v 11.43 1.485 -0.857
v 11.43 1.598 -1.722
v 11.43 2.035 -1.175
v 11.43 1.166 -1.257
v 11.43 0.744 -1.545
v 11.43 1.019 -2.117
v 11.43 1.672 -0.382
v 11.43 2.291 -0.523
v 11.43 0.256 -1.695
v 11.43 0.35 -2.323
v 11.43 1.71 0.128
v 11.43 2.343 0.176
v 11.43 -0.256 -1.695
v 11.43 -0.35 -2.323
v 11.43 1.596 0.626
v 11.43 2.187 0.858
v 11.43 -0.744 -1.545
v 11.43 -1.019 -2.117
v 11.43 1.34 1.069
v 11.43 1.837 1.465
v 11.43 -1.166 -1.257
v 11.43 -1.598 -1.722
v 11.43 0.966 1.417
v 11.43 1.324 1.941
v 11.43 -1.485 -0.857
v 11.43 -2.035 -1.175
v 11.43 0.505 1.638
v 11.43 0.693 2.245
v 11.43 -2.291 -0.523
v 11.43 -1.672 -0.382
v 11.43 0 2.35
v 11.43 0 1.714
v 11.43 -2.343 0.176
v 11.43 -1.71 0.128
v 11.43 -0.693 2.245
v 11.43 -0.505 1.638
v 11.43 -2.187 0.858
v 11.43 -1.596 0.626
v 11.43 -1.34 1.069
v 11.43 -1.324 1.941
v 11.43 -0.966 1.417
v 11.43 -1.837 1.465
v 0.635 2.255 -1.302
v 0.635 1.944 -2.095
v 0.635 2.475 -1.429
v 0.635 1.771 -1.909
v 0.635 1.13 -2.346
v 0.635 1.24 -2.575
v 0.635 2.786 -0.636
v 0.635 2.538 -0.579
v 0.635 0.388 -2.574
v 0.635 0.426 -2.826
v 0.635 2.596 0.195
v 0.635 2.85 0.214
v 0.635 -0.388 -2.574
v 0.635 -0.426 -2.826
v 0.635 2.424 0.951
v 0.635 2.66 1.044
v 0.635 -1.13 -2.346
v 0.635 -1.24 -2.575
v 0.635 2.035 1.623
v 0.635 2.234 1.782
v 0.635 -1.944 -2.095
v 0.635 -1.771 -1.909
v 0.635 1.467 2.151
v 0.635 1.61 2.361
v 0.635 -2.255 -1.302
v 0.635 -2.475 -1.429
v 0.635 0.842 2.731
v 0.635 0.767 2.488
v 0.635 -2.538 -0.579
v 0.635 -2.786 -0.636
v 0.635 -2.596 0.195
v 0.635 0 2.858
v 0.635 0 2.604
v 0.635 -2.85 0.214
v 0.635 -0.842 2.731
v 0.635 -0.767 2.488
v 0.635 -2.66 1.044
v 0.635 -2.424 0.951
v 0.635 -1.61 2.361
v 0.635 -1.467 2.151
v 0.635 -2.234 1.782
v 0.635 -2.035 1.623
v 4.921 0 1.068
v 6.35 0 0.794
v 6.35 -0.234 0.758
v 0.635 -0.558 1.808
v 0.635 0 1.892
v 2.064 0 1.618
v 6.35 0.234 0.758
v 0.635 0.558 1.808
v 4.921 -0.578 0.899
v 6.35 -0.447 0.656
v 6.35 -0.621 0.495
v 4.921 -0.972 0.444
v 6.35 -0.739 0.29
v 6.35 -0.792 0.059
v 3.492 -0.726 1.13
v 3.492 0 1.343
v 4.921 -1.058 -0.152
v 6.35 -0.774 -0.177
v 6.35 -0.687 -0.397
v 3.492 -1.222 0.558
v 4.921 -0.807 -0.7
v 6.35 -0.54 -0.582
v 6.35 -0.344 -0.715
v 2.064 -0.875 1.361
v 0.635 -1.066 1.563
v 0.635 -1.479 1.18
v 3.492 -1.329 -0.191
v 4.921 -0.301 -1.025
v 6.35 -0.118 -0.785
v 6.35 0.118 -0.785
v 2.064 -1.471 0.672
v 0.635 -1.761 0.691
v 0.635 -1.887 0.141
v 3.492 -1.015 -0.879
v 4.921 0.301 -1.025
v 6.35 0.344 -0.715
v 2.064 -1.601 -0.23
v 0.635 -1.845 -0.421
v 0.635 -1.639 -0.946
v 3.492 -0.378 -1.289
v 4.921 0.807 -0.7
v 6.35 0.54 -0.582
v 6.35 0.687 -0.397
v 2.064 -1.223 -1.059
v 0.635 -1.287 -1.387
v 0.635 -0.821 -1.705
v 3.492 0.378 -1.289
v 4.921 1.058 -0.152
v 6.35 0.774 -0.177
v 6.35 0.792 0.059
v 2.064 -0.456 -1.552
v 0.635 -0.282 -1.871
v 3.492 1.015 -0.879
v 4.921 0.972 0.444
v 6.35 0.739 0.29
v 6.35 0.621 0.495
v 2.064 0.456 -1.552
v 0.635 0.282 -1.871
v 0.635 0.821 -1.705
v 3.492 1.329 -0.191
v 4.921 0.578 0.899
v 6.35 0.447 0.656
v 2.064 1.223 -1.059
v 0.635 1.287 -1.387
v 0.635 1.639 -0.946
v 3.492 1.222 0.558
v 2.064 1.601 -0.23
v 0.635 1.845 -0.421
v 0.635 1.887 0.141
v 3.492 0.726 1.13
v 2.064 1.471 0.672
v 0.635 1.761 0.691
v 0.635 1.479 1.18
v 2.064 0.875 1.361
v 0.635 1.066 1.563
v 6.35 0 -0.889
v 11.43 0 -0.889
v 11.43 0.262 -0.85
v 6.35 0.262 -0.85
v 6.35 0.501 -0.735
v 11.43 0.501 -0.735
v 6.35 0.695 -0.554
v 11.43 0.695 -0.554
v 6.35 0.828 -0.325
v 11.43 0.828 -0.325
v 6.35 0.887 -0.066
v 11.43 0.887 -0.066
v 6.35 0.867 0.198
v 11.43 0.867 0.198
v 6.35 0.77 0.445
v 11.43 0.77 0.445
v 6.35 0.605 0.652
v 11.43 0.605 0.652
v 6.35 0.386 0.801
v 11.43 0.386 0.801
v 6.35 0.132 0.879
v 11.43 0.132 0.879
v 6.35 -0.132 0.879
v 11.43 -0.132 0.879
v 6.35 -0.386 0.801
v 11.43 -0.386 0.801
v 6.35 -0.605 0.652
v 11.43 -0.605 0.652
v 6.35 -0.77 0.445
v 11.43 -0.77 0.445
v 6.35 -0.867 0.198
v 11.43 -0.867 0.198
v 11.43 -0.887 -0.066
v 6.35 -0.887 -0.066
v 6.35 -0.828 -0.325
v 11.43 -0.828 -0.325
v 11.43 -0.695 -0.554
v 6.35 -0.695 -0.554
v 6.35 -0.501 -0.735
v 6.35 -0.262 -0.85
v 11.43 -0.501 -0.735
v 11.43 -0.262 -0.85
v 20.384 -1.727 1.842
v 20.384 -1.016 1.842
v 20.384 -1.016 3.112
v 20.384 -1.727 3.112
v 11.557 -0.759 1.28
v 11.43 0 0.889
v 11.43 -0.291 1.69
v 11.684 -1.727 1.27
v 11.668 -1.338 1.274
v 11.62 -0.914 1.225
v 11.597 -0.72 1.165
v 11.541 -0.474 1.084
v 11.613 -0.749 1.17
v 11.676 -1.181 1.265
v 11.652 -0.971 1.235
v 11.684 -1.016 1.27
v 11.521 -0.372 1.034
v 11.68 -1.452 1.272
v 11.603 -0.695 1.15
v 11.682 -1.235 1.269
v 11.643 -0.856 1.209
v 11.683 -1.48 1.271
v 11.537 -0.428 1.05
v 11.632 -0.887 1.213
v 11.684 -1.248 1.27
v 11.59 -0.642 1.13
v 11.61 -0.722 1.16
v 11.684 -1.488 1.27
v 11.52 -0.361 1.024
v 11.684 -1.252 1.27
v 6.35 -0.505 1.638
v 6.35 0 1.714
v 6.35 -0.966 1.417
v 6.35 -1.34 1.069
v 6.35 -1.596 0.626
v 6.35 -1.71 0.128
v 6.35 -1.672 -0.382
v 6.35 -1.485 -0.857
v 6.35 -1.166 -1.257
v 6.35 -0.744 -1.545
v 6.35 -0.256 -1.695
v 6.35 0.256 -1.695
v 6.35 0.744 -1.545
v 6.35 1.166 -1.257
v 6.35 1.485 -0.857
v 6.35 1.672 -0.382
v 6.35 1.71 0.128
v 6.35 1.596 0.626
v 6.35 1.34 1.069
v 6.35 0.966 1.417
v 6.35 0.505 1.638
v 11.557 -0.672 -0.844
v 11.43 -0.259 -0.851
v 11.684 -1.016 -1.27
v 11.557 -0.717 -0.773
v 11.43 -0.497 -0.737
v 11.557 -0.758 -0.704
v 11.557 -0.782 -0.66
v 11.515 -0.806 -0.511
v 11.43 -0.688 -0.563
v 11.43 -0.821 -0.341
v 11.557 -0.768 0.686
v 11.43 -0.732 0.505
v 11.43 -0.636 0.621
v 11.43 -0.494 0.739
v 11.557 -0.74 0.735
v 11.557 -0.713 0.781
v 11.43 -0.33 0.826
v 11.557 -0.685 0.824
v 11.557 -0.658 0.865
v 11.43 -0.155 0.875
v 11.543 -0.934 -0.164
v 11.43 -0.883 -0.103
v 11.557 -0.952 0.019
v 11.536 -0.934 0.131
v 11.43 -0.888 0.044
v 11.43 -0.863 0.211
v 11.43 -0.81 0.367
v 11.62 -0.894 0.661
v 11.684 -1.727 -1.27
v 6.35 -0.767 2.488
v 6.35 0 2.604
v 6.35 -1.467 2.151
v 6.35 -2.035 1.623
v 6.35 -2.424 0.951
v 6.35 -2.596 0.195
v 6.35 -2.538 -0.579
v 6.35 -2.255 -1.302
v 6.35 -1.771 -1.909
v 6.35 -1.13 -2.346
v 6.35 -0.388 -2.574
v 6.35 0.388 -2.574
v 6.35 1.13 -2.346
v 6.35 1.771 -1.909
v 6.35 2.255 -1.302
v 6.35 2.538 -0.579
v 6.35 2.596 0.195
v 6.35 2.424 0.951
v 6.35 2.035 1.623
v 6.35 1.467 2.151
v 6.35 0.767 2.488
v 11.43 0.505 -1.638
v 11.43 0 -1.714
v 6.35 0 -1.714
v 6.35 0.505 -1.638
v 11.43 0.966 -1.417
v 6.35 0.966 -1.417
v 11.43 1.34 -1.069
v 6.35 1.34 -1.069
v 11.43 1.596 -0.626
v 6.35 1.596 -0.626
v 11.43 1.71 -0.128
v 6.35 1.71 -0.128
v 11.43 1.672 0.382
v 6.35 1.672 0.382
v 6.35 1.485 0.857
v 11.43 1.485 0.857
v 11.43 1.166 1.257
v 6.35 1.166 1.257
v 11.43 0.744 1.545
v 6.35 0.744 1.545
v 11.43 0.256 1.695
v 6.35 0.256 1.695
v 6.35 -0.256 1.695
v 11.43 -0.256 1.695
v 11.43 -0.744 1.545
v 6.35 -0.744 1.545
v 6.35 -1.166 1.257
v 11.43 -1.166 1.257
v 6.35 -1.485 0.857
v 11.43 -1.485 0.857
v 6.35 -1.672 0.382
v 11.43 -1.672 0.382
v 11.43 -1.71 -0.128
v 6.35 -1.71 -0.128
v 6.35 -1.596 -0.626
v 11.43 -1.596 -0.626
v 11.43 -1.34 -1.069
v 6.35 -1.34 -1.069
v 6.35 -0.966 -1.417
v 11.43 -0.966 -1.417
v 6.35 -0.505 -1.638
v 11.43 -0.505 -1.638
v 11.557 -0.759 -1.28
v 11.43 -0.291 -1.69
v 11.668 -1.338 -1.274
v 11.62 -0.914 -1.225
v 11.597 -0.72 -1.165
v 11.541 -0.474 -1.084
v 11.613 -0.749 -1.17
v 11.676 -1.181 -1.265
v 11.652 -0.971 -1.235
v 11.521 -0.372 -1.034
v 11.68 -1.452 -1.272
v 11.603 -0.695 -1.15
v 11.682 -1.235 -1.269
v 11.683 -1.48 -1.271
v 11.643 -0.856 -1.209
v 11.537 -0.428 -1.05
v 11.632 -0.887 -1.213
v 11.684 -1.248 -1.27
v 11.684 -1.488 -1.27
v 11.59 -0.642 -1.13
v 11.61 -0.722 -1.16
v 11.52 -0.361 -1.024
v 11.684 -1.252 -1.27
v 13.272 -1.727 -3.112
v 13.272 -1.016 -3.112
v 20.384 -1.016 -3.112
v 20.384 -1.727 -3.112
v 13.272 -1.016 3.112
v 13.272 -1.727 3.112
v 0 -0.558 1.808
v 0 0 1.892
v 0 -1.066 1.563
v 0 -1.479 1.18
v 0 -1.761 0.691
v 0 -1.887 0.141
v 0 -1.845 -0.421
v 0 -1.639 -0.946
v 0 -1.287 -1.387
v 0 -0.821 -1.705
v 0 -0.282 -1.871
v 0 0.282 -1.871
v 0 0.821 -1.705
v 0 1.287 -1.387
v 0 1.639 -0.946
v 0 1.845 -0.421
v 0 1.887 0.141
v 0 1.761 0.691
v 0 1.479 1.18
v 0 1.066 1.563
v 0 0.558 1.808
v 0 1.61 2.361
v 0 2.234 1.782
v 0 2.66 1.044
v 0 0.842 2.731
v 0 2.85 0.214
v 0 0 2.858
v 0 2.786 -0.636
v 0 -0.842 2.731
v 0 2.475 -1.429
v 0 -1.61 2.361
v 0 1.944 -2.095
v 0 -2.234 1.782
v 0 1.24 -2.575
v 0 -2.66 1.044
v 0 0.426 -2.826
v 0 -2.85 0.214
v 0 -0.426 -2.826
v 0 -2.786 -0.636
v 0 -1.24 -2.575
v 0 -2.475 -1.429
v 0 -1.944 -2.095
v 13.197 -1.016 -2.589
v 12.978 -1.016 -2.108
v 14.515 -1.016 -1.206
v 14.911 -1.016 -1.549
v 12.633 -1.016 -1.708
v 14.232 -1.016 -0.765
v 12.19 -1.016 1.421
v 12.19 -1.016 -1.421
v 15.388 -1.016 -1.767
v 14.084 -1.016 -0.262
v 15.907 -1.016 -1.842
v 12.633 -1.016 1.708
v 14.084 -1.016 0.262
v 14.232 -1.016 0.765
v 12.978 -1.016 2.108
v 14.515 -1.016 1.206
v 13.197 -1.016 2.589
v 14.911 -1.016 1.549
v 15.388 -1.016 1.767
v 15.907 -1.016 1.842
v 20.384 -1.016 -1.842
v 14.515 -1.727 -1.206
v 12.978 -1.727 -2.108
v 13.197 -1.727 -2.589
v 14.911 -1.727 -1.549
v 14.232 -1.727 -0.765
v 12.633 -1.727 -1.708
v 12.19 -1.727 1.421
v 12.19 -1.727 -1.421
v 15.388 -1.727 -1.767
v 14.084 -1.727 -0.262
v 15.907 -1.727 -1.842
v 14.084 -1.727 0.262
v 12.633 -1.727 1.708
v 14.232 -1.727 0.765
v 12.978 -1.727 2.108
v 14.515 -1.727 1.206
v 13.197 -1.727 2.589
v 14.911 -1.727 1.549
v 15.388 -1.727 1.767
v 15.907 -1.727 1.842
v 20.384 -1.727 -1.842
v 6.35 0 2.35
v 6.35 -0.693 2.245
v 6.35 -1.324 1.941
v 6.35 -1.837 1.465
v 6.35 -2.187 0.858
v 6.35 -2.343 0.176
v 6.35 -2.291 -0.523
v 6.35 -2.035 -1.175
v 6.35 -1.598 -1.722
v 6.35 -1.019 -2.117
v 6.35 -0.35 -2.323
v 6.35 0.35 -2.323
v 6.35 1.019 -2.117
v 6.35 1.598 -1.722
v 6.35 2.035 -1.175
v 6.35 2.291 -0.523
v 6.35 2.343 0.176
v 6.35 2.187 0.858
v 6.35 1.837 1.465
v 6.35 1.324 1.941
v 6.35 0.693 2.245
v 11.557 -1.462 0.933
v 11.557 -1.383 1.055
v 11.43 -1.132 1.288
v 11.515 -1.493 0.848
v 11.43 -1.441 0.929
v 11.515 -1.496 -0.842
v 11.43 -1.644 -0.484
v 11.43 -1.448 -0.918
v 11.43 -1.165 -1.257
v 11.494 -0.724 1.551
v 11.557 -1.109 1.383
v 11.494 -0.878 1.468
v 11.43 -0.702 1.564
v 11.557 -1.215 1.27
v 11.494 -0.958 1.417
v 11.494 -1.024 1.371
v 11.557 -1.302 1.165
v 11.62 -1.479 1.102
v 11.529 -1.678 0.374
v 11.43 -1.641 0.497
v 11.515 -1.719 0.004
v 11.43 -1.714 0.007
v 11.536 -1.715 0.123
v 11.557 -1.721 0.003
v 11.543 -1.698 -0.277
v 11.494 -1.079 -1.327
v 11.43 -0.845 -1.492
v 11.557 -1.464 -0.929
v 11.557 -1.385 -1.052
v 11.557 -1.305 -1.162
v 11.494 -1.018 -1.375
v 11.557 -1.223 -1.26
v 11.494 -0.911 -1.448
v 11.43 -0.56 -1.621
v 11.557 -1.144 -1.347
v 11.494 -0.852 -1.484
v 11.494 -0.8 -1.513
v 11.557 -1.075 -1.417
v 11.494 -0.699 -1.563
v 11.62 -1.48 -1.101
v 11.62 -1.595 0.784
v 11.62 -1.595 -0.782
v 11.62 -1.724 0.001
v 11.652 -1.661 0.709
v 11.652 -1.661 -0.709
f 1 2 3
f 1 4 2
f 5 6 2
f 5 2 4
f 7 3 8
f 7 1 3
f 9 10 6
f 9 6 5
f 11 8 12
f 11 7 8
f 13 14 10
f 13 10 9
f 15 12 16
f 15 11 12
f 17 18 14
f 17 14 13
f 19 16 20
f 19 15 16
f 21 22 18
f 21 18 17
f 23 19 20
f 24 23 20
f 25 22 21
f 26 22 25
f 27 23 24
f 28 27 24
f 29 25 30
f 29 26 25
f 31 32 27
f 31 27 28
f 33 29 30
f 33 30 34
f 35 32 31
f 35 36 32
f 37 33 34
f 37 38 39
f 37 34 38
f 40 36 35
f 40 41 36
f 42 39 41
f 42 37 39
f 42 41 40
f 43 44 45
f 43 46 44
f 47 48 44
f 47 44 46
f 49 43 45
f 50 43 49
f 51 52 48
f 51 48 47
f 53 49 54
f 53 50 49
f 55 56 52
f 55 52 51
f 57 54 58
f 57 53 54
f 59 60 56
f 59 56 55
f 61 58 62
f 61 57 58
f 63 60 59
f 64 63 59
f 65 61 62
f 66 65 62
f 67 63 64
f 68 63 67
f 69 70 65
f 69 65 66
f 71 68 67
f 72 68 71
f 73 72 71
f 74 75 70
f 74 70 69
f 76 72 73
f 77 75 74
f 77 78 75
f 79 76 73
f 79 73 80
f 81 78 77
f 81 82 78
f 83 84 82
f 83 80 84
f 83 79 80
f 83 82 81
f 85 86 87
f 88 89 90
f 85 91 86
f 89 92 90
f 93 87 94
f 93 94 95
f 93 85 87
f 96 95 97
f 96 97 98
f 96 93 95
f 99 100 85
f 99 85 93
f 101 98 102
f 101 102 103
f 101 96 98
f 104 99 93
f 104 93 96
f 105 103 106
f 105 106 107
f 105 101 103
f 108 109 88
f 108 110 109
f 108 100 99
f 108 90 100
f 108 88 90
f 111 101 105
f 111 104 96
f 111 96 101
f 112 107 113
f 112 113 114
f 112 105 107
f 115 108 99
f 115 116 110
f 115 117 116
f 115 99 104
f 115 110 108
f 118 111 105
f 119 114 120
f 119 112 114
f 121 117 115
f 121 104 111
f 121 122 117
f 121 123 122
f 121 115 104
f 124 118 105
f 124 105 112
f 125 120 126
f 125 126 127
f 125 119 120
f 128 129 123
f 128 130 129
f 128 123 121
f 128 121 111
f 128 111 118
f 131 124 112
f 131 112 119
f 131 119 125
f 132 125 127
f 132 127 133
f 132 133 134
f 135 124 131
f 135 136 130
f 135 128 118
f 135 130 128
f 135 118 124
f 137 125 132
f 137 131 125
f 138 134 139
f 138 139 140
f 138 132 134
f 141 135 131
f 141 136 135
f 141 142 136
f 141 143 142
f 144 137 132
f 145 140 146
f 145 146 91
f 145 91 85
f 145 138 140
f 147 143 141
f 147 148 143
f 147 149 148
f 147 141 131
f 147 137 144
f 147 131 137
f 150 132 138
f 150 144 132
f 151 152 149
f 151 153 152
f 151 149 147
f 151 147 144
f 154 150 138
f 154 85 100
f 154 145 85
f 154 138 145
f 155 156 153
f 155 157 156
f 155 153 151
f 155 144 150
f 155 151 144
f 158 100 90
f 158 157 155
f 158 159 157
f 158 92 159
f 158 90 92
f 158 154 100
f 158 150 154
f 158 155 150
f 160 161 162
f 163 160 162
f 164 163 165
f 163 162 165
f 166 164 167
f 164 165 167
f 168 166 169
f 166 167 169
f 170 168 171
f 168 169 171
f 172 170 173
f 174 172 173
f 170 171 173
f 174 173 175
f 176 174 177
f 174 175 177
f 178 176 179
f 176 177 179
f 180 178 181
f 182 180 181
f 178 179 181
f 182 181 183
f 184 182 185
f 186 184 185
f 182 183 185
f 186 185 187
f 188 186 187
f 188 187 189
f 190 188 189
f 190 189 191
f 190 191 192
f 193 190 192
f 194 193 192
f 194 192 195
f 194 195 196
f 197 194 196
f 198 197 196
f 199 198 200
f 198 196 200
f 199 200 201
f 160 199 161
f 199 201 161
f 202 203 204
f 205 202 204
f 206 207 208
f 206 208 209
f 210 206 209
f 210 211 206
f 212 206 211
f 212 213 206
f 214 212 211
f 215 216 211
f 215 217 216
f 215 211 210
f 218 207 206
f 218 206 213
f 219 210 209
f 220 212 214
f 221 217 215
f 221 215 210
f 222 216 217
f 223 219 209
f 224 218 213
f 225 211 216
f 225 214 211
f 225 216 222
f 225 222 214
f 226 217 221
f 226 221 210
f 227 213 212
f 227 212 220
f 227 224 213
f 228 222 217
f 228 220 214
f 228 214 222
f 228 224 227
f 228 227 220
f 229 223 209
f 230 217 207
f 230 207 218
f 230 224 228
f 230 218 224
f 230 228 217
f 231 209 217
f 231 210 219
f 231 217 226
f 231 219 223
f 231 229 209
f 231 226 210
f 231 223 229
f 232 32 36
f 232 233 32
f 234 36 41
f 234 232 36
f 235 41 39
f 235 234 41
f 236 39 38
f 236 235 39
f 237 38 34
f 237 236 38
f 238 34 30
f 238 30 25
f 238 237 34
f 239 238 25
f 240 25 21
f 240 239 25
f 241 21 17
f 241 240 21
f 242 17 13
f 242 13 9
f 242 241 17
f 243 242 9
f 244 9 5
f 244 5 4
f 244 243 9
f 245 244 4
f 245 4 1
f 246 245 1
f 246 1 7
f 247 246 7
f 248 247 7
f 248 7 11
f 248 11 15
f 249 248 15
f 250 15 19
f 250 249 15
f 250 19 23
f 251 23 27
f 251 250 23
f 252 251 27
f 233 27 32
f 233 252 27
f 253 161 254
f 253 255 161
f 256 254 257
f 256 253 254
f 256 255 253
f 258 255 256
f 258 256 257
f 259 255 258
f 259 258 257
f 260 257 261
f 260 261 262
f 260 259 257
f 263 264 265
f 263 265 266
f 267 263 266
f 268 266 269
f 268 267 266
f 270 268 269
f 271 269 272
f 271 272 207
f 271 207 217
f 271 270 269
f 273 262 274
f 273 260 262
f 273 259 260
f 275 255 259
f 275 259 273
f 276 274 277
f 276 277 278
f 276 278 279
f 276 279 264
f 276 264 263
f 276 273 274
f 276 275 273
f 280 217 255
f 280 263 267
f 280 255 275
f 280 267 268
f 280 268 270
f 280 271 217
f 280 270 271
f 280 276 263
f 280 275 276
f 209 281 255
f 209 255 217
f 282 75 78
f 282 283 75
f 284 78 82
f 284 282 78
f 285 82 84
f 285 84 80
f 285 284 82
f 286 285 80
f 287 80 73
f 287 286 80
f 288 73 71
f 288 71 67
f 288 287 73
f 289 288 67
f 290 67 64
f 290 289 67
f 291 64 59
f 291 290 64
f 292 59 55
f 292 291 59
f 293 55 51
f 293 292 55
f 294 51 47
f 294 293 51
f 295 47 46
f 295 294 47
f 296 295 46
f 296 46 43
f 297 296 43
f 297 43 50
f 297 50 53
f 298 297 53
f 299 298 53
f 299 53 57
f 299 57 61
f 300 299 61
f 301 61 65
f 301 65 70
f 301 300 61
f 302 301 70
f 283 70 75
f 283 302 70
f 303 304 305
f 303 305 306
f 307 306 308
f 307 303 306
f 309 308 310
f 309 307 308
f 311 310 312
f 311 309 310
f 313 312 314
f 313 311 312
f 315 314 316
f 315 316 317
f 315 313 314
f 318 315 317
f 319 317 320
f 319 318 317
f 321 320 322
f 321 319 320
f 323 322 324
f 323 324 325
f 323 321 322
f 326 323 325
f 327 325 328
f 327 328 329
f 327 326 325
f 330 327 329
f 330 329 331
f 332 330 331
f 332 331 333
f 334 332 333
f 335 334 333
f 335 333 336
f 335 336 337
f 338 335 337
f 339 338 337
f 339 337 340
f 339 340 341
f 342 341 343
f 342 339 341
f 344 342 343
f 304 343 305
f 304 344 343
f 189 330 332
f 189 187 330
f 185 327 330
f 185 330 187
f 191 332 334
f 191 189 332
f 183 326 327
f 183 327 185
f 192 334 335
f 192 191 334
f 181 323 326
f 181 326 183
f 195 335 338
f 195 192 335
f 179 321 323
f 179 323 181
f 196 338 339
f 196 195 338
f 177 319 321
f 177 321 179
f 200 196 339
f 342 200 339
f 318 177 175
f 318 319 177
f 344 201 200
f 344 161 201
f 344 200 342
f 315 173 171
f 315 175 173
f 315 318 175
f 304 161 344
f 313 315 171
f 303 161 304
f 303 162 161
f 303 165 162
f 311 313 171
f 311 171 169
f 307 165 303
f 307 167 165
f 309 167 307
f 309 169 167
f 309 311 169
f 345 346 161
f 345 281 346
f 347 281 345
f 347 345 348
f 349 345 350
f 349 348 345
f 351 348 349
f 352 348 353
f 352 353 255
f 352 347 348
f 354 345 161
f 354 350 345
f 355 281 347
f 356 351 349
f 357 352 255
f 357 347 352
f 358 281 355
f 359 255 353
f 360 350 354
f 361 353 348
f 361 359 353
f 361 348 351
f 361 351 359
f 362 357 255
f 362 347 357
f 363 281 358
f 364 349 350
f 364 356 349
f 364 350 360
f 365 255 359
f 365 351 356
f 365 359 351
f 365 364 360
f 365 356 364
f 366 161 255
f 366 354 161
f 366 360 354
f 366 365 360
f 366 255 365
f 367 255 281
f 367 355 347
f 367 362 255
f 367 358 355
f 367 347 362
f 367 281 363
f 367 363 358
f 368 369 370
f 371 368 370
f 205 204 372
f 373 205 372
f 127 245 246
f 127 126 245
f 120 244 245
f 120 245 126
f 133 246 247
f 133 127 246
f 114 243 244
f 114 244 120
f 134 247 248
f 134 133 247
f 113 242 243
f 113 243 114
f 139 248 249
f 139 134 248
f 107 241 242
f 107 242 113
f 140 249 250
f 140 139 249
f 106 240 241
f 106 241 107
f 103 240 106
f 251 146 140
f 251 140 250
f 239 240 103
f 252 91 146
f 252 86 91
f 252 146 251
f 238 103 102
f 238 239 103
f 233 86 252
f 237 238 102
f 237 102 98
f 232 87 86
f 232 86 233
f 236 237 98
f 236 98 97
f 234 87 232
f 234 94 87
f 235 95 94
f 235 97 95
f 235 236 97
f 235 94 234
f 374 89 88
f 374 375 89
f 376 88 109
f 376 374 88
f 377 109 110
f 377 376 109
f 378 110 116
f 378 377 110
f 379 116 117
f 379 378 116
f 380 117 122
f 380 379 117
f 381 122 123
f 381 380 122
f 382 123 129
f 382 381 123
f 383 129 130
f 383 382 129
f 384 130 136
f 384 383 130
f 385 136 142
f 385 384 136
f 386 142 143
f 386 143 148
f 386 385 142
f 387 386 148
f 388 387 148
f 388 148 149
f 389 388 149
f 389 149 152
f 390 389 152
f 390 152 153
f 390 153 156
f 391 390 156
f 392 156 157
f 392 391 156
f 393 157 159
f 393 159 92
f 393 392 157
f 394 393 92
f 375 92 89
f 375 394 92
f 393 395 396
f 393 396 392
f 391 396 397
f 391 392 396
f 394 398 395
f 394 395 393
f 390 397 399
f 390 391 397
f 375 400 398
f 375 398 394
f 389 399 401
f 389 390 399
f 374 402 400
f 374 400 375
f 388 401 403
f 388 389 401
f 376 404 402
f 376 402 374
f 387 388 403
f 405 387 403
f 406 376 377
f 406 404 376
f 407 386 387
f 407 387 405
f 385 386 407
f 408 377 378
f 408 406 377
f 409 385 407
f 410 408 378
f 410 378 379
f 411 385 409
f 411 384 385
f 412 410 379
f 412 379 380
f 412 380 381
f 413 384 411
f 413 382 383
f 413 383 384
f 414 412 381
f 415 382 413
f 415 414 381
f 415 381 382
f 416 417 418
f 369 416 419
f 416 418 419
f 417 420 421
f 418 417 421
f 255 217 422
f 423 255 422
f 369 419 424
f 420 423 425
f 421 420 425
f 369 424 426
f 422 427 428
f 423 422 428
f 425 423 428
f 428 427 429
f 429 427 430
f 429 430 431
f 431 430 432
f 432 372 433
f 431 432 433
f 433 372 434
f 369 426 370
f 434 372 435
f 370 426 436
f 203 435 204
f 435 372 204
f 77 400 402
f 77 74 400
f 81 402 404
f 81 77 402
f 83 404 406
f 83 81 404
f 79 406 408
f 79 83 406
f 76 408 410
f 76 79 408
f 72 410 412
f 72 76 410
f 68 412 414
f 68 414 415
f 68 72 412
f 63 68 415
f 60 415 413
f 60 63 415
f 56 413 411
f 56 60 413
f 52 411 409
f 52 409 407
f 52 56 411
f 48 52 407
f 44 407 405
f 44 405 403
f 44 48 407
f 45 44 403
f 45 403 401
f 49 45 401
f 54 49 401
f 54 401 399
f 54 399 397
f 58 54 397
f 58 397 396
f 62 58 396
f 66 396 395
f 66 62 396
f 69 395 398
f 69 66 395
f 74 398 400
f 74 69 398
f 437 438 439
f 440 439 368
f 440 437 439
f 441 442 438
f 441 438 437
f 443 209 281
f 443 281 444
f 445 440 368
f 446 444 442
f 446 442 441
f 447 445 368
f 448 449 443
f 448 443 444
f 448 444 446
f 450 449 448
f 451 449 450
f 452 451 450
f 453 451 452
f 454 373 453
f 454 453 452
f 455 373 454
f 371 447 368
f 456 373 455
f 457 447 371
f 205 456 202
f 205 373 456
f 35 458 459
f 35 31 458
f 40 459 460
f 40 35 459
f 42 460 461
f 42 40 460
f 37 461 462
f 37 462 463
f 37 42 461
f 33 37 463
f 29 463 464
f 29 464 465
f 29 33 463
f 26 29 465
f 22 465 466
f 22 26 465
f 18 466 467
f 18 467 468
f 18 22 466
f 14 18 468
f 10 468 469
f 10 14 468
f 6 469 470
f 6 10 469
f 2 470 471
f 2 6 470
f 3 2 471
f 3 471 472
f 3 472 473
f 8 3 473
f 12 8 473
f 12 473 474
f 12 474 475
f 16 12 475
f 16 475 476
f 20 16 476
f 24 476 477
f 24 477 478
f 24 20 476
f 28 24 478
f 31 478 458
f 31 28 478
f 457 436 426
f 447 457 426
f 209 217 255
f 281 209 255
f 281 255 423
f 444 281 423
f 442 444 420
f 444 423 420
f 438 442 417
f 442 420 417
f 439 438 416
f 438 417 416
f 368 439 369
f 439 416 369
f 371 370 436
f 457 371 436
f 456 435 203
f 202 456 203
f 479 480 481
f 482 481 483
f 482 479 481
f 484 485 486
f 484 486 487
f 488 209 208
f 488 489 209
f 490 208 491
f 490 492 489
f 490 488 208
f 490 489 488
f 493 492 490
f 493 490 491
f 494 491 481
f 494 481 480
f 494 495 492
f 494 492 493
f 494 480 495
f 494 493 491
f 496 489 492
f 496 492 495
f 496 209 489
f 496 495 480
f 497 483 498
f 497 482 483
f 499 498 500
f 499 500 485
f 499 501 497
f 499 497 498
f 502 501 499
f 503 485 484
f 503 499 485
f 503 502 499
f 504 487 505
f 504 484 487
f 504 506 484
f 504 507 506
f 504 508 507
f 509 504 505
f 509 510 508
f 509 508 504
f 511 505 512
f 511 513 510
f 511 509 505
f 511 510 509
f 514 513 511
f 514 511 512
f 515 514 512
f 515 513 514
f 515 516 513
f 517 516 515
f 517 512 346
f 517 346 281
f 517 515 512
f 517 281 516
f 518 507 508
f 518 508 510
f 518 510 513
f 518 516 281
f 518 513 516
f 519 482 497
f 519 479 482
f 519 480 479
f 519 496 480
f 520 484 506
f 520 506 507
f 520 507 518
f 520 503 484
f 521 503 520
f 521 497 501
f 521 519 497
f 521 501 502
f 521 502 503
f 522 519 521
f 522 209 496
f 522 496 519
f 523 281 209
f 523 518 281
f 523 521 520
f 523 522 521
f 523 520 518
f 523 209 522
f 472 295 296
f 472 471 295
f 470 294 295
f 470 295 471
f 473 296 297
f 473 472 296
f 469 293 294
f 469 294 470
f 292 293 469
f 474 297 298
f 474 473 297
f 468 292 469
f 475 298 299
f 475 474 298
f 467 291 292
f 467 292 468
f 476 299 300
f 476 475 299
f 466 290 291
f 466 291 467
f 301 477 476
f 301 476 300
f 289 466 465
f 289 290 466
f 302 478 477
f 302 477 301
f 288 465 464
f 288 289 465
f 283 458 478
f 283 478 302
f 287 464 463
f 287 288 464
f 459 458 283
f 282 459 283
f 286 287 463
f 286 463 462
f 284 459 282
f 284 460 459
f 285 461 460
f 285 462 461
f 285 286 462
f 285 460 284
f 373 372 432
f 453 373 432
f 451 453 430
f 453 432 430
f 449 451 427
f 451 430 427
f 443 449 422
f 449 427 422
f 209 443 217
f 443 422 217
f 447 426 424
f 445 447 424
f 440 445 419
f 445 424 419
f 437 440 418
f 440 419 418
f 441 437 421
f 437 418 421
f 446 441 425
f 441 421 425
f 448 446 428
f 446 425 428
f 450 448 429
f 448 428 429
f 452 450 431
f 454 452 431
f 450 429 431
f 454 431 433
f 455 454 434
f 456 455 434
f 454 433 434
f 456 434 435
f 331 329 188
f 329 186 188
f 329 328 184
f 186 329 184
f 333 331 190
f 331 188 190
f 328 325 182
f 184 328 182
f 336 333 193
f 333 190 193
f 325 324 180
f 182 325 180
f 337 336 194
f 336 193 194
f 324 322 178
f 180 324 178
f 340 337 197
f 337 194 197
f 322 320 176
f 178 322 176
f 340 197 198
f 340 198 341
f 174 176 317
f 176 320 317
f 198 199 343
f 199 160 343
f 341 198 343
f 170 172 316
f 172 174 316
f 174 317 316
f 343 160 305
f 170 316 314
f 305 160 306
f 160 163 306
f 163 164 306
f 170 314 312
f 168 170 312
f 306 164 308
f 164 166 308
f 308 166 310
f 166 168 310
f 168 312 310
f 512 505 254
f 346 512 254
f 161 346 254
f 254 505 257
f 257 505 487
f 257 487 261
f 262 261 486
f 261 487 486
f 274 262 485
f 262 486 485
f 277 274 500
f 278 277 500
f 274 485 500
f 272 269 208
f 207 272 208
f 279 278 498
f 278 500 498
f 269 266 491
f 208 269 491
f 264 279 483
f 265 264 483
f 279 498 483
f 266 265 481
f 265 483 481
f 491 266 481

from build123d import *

# Parameters (mm, degrees)
EXTRUDE6_DEPTH = 0.7112
SKETCH11_R     = 1.7145
SKETCH11_R_2   = 0.889
EXTRUDE7_DEPTH = 5.08


with BuildPart() as part:
    # Sketch5 → Revolve1 (revolve)
    with BuildSketch(Plane.XY, mode=Mode.PRIVATE) as revolve1_sk:
        Polygon((0, 2.8575), (0.635, 2.8575), (0.635, 2.6035), (6.35, 2.6035), (6.35, 2.3495), (11.43, 2.3495), (11.43, 1.7145), (6.35, 1.7145), (6.35, 0.79375), (0.635, 1.8923), (0, 1.8923), align=None)
    revolve(revolve1_sk.sketch.rotate(Axis((0, 0, 0), (1, 0, 0)), 90), axis=Axis((0, 0, 0), (1, 0, 0)))


with BuildPart() as body_2:
    # Sketch7 → Extrude6 (new body)
    with BuildSketch(Plane(origin=(0, -1.016, 0), x_dir=(-1, 0, 0), z_dir=(0, 1, 0))):
        with BuildLine():
            Line((-13.2715, -3.1115), (-20.3835, -3.1115))
            Line((-20.3835, -3.1115), (-20.3835, -1.8415))
            Line((-20.3835, -1.8415), (-15.90675, -1.8415))
            ThreePointArc((-15.90675, -1.8415), (-14.06525, 0), (-15.90675, 1.8415))
            Line((-15.90675, 1.8415), (-20.3835, 1.8415))
            Line((-20.3835, 1.8415), (-20.3835, 3.1115))
            Line((-20.3835, 3.1115), (-13.2715, 3.1115))
            ThreePointArc((-13.2715, 3.1115), (-12.819841015, 1.895843953), (-11.684, 1.27))
            Line((-11.684, 1.27), (-11.684, -1.27))
            ThreePointArc((-11.684, -1.27), (-12.819841015, -1.895843953), (-13.2715, -3.1115))
        make_face()
    extrude(amount=-EXTRUDE6_DEPTH)


with BuildPart() as body_3:
    # Sketch11 → Extrude7 (new body)
    with BuildSketch(Plane(origin=(11.43, 0, 0), x_dir=(0, 0, -1), z_dir=(1, 0, 0))):
        Circle(SKETCH11_R)
        Circle(SKETCH11_R_2, mode=Mode.SUBTRACT)
    extrude(amount=-EXTRUDE7_DEPTH)


with BuildPart() as body_4:
    # Loft3: read off the stored shape, not the designer's step
    # Loft3: loft between two sections, ruled curve by curve
    loft3_from = [
        Edge.make_bspline([(11.43, -0.291379498, 1.689558593), (11.43, -0.430127833, 1.665630201), (11.43, -0.581040717, 1.622189064), (11.43, -0.891753825, 1.474408623), (11.43, -1.051676044, 1.369408232), (11.43, -1.344177572, 1.083738003), (11.43, -1.475965629, 0.902303445), (11.43, -1.661847679, 0.480508416), (11.43, -1.7145, 0.240688121), (11.43, -1.7145, -0.240688121), (11.43, -1.661847679, -0.480508416), (11.43, -1.475965629, -0.902303445), (11.43, -1.344177572, -1.083738003), (11.43, -1.051676044, -1.369408232), (11.43, -0.891753825, -1.474408623), (11.43, -0.581040717, -1.622189064), (11.43, -0.430127833, -1.665630201), (11.43, -0.291379498, -1.689558593)], [0, 0, 0, 0, 0.125, 0.125, 0.25, 0.25, 0.375, 0.375, 0.5, 0.5, 0.625, 0.625, 0.75, 0.75, 0.875, 0.875, 1, 1, 1, 1], 3),
        Edge.make_bspline([(11.43, -0.291379498, -1.689558593), (11.43, -0.242816249, -1.556132161), (11.43, -0.194252999, -1.422705728), (11.43, -0.097126499, -1.155852864), (11.43, -0.04856325, -1.022426432), (11.43, 0, -0.889)], [0, 0, 0, 0, 0.5, 0.5, 1, 1, 1, 1], 3),
        Edge.make_bspline([(11.43, 0, 0.889), (11.43, -0.04856325, 1.022426432), (11.43, -0.097126499, 1.155852864), (11.43, -0.194252999, 1.422705728), (11.43, -0.242816249, 1.556132161), (11.43, -0.291379498, 1.689558593)], [0, 0, 0, 0, 0.5, 0.5, 1, 1, 1, 1], 3),
        Edge.make_bspline([(11.43, 0, -0.889), (11.43, -0.074083333, -0.889), (11.43, -0.1578864, -0.879991467), (11.43, -0.3399536, -0.826888533), (11.43, -0.438573333, -0.78232), (11.43, -0.628226667, -0.64008), (11.43, -0.718787774, -0.541397924), (11.43, -0.850035755, -0.295307958), (11.43, -0.889, -0.148166667), (11.43, -0.889, 0.148166667), (11.43, -0.850035755, 0.295307958), (11.43, -0.718787774, 0.541397924), (11.43, -0.628226667, 0.64008), (11.43, -0.438573333, 0.78232), (11.43, -0.3399536, 0.826888533), (11.43, -0.1578864, 0.879991467), (11.43, -0.074083333, 0.889), (11.43, 0, 0.889)], [0, 0, 0, 0, 0.125, 0.125, 0.25, 0.25, 0.375, 0.375, 0.5, 0.5, 0.625, 0.625, 0.75, 0.75, 0.875, 0.875, 1, 1, 1, 1], 3),
    ]
    loft3_to = [
        Edge.make_bspline([(11.684, -1.7272, 1.27), (11.684, -1.7272, 1.164166667), (11.684, -1.7272, 1.058333333), (11.684, -1.7272, 0.846666667), (11.684, -1.7272, 0.740833333), (11.684, -1.7272, 0.529166667), (11.684, -1.7272, 0.423333333), (11.684, -1.7272, 0.211666667), (11.684, -1.7272, 0.105833333), (11.684, -1.7272, -0.105833333), (11.684, -1.7272, -0.211666667), (11.684, -1.7272, -0.423333333), (11.684, -1.7272, -0.529166667), (11.684, -1.7272, -0.740833333), (11.684, -1.7272, -0.846666667), (11.684, -1.7272, -1.058333333), (11.684, -1.7272, -1.164166667), (11.684, -1.7272, -1.27)], [0, 0, 0, 0, 0.125, 0.125, 0.25, 0.25, 0.375, 0.375, 0.5, 0.5, 0.625, 0.625, 0.75, 0.75, 0.875, 0.875, 1, 1, 1, 1], 3),
        Edge.make_bspline([(11.684, -1.7272, -1.27), (11.684, -1.608666667, -1.27), (11.684, -1.490133333, -1.27), (11.684, -1.253066667, -1.27), (11.684, -1.134533333, -1.27), (11.684, -1.016, -1.27)], [0, 0, 0, 0, 0.5, 0.5, 1, 1, 1, 1], 3),
        Edge.make_bspline([(11.684, -1.016, 1.27), (11.684, -1.134533333, 1.27), (11.684, -1.253066667, 1.27), (11.684, -1.490133333, 1.27), (11.684, -1.608666667, 1.27), (11.684, -1.7272, 1.27)], [0, 0, 0, 0, 0.5, 0.5, 1, 1, 1, 1], 3),
        Edge.make_bspline([(11.684, -1.016, -1.27), (11.684, -1.016, -1.164166667), (11.684, -1.016, -1.058333333), (11.684, -1.016, -0.846666667), (11.684, -1.016, -0.740833333), (11.684, -1.016, -0.529166667), (11.684, -1.016, -0.423333333), (11.684, -1.016, -0.211666667), (11.684, -1.016, -0.105833333), (11.684, -1.016, 0.105833333), (11.684, -1.016, 0.211666667), (11.684, -1.016, 0.423333333), (11.684, -1.016, 0.529166667), (11.684, -1.016, 0.740833333), (11.684, -1.016, 0.846666667), (11.684, -1.016, 1.058333333), (11.684, -1.016, 1.164166667), (11.684, -1.016, 1.27)], [0, 0, 0, 0, 0.125, 0.125, 0.25, 0.25, 0.375, 0.375, 0.5, 0.5, 0.625, 0.625, 0.75, 0.75, 0.875, 0.875, 1, 1, 1, 1], 3),
    ]
    loft3 = Solid(Shell([*[Face.make_surface_from_curves(loft3_from[k], loft3_to[k]) for k in range(4)], Face(Wire(loft3_from)), Face(Wire(loft3_to))]))
    add(loft3)


solid = Compound([part.part, body_2.part, body_3.part, body_4.part])
